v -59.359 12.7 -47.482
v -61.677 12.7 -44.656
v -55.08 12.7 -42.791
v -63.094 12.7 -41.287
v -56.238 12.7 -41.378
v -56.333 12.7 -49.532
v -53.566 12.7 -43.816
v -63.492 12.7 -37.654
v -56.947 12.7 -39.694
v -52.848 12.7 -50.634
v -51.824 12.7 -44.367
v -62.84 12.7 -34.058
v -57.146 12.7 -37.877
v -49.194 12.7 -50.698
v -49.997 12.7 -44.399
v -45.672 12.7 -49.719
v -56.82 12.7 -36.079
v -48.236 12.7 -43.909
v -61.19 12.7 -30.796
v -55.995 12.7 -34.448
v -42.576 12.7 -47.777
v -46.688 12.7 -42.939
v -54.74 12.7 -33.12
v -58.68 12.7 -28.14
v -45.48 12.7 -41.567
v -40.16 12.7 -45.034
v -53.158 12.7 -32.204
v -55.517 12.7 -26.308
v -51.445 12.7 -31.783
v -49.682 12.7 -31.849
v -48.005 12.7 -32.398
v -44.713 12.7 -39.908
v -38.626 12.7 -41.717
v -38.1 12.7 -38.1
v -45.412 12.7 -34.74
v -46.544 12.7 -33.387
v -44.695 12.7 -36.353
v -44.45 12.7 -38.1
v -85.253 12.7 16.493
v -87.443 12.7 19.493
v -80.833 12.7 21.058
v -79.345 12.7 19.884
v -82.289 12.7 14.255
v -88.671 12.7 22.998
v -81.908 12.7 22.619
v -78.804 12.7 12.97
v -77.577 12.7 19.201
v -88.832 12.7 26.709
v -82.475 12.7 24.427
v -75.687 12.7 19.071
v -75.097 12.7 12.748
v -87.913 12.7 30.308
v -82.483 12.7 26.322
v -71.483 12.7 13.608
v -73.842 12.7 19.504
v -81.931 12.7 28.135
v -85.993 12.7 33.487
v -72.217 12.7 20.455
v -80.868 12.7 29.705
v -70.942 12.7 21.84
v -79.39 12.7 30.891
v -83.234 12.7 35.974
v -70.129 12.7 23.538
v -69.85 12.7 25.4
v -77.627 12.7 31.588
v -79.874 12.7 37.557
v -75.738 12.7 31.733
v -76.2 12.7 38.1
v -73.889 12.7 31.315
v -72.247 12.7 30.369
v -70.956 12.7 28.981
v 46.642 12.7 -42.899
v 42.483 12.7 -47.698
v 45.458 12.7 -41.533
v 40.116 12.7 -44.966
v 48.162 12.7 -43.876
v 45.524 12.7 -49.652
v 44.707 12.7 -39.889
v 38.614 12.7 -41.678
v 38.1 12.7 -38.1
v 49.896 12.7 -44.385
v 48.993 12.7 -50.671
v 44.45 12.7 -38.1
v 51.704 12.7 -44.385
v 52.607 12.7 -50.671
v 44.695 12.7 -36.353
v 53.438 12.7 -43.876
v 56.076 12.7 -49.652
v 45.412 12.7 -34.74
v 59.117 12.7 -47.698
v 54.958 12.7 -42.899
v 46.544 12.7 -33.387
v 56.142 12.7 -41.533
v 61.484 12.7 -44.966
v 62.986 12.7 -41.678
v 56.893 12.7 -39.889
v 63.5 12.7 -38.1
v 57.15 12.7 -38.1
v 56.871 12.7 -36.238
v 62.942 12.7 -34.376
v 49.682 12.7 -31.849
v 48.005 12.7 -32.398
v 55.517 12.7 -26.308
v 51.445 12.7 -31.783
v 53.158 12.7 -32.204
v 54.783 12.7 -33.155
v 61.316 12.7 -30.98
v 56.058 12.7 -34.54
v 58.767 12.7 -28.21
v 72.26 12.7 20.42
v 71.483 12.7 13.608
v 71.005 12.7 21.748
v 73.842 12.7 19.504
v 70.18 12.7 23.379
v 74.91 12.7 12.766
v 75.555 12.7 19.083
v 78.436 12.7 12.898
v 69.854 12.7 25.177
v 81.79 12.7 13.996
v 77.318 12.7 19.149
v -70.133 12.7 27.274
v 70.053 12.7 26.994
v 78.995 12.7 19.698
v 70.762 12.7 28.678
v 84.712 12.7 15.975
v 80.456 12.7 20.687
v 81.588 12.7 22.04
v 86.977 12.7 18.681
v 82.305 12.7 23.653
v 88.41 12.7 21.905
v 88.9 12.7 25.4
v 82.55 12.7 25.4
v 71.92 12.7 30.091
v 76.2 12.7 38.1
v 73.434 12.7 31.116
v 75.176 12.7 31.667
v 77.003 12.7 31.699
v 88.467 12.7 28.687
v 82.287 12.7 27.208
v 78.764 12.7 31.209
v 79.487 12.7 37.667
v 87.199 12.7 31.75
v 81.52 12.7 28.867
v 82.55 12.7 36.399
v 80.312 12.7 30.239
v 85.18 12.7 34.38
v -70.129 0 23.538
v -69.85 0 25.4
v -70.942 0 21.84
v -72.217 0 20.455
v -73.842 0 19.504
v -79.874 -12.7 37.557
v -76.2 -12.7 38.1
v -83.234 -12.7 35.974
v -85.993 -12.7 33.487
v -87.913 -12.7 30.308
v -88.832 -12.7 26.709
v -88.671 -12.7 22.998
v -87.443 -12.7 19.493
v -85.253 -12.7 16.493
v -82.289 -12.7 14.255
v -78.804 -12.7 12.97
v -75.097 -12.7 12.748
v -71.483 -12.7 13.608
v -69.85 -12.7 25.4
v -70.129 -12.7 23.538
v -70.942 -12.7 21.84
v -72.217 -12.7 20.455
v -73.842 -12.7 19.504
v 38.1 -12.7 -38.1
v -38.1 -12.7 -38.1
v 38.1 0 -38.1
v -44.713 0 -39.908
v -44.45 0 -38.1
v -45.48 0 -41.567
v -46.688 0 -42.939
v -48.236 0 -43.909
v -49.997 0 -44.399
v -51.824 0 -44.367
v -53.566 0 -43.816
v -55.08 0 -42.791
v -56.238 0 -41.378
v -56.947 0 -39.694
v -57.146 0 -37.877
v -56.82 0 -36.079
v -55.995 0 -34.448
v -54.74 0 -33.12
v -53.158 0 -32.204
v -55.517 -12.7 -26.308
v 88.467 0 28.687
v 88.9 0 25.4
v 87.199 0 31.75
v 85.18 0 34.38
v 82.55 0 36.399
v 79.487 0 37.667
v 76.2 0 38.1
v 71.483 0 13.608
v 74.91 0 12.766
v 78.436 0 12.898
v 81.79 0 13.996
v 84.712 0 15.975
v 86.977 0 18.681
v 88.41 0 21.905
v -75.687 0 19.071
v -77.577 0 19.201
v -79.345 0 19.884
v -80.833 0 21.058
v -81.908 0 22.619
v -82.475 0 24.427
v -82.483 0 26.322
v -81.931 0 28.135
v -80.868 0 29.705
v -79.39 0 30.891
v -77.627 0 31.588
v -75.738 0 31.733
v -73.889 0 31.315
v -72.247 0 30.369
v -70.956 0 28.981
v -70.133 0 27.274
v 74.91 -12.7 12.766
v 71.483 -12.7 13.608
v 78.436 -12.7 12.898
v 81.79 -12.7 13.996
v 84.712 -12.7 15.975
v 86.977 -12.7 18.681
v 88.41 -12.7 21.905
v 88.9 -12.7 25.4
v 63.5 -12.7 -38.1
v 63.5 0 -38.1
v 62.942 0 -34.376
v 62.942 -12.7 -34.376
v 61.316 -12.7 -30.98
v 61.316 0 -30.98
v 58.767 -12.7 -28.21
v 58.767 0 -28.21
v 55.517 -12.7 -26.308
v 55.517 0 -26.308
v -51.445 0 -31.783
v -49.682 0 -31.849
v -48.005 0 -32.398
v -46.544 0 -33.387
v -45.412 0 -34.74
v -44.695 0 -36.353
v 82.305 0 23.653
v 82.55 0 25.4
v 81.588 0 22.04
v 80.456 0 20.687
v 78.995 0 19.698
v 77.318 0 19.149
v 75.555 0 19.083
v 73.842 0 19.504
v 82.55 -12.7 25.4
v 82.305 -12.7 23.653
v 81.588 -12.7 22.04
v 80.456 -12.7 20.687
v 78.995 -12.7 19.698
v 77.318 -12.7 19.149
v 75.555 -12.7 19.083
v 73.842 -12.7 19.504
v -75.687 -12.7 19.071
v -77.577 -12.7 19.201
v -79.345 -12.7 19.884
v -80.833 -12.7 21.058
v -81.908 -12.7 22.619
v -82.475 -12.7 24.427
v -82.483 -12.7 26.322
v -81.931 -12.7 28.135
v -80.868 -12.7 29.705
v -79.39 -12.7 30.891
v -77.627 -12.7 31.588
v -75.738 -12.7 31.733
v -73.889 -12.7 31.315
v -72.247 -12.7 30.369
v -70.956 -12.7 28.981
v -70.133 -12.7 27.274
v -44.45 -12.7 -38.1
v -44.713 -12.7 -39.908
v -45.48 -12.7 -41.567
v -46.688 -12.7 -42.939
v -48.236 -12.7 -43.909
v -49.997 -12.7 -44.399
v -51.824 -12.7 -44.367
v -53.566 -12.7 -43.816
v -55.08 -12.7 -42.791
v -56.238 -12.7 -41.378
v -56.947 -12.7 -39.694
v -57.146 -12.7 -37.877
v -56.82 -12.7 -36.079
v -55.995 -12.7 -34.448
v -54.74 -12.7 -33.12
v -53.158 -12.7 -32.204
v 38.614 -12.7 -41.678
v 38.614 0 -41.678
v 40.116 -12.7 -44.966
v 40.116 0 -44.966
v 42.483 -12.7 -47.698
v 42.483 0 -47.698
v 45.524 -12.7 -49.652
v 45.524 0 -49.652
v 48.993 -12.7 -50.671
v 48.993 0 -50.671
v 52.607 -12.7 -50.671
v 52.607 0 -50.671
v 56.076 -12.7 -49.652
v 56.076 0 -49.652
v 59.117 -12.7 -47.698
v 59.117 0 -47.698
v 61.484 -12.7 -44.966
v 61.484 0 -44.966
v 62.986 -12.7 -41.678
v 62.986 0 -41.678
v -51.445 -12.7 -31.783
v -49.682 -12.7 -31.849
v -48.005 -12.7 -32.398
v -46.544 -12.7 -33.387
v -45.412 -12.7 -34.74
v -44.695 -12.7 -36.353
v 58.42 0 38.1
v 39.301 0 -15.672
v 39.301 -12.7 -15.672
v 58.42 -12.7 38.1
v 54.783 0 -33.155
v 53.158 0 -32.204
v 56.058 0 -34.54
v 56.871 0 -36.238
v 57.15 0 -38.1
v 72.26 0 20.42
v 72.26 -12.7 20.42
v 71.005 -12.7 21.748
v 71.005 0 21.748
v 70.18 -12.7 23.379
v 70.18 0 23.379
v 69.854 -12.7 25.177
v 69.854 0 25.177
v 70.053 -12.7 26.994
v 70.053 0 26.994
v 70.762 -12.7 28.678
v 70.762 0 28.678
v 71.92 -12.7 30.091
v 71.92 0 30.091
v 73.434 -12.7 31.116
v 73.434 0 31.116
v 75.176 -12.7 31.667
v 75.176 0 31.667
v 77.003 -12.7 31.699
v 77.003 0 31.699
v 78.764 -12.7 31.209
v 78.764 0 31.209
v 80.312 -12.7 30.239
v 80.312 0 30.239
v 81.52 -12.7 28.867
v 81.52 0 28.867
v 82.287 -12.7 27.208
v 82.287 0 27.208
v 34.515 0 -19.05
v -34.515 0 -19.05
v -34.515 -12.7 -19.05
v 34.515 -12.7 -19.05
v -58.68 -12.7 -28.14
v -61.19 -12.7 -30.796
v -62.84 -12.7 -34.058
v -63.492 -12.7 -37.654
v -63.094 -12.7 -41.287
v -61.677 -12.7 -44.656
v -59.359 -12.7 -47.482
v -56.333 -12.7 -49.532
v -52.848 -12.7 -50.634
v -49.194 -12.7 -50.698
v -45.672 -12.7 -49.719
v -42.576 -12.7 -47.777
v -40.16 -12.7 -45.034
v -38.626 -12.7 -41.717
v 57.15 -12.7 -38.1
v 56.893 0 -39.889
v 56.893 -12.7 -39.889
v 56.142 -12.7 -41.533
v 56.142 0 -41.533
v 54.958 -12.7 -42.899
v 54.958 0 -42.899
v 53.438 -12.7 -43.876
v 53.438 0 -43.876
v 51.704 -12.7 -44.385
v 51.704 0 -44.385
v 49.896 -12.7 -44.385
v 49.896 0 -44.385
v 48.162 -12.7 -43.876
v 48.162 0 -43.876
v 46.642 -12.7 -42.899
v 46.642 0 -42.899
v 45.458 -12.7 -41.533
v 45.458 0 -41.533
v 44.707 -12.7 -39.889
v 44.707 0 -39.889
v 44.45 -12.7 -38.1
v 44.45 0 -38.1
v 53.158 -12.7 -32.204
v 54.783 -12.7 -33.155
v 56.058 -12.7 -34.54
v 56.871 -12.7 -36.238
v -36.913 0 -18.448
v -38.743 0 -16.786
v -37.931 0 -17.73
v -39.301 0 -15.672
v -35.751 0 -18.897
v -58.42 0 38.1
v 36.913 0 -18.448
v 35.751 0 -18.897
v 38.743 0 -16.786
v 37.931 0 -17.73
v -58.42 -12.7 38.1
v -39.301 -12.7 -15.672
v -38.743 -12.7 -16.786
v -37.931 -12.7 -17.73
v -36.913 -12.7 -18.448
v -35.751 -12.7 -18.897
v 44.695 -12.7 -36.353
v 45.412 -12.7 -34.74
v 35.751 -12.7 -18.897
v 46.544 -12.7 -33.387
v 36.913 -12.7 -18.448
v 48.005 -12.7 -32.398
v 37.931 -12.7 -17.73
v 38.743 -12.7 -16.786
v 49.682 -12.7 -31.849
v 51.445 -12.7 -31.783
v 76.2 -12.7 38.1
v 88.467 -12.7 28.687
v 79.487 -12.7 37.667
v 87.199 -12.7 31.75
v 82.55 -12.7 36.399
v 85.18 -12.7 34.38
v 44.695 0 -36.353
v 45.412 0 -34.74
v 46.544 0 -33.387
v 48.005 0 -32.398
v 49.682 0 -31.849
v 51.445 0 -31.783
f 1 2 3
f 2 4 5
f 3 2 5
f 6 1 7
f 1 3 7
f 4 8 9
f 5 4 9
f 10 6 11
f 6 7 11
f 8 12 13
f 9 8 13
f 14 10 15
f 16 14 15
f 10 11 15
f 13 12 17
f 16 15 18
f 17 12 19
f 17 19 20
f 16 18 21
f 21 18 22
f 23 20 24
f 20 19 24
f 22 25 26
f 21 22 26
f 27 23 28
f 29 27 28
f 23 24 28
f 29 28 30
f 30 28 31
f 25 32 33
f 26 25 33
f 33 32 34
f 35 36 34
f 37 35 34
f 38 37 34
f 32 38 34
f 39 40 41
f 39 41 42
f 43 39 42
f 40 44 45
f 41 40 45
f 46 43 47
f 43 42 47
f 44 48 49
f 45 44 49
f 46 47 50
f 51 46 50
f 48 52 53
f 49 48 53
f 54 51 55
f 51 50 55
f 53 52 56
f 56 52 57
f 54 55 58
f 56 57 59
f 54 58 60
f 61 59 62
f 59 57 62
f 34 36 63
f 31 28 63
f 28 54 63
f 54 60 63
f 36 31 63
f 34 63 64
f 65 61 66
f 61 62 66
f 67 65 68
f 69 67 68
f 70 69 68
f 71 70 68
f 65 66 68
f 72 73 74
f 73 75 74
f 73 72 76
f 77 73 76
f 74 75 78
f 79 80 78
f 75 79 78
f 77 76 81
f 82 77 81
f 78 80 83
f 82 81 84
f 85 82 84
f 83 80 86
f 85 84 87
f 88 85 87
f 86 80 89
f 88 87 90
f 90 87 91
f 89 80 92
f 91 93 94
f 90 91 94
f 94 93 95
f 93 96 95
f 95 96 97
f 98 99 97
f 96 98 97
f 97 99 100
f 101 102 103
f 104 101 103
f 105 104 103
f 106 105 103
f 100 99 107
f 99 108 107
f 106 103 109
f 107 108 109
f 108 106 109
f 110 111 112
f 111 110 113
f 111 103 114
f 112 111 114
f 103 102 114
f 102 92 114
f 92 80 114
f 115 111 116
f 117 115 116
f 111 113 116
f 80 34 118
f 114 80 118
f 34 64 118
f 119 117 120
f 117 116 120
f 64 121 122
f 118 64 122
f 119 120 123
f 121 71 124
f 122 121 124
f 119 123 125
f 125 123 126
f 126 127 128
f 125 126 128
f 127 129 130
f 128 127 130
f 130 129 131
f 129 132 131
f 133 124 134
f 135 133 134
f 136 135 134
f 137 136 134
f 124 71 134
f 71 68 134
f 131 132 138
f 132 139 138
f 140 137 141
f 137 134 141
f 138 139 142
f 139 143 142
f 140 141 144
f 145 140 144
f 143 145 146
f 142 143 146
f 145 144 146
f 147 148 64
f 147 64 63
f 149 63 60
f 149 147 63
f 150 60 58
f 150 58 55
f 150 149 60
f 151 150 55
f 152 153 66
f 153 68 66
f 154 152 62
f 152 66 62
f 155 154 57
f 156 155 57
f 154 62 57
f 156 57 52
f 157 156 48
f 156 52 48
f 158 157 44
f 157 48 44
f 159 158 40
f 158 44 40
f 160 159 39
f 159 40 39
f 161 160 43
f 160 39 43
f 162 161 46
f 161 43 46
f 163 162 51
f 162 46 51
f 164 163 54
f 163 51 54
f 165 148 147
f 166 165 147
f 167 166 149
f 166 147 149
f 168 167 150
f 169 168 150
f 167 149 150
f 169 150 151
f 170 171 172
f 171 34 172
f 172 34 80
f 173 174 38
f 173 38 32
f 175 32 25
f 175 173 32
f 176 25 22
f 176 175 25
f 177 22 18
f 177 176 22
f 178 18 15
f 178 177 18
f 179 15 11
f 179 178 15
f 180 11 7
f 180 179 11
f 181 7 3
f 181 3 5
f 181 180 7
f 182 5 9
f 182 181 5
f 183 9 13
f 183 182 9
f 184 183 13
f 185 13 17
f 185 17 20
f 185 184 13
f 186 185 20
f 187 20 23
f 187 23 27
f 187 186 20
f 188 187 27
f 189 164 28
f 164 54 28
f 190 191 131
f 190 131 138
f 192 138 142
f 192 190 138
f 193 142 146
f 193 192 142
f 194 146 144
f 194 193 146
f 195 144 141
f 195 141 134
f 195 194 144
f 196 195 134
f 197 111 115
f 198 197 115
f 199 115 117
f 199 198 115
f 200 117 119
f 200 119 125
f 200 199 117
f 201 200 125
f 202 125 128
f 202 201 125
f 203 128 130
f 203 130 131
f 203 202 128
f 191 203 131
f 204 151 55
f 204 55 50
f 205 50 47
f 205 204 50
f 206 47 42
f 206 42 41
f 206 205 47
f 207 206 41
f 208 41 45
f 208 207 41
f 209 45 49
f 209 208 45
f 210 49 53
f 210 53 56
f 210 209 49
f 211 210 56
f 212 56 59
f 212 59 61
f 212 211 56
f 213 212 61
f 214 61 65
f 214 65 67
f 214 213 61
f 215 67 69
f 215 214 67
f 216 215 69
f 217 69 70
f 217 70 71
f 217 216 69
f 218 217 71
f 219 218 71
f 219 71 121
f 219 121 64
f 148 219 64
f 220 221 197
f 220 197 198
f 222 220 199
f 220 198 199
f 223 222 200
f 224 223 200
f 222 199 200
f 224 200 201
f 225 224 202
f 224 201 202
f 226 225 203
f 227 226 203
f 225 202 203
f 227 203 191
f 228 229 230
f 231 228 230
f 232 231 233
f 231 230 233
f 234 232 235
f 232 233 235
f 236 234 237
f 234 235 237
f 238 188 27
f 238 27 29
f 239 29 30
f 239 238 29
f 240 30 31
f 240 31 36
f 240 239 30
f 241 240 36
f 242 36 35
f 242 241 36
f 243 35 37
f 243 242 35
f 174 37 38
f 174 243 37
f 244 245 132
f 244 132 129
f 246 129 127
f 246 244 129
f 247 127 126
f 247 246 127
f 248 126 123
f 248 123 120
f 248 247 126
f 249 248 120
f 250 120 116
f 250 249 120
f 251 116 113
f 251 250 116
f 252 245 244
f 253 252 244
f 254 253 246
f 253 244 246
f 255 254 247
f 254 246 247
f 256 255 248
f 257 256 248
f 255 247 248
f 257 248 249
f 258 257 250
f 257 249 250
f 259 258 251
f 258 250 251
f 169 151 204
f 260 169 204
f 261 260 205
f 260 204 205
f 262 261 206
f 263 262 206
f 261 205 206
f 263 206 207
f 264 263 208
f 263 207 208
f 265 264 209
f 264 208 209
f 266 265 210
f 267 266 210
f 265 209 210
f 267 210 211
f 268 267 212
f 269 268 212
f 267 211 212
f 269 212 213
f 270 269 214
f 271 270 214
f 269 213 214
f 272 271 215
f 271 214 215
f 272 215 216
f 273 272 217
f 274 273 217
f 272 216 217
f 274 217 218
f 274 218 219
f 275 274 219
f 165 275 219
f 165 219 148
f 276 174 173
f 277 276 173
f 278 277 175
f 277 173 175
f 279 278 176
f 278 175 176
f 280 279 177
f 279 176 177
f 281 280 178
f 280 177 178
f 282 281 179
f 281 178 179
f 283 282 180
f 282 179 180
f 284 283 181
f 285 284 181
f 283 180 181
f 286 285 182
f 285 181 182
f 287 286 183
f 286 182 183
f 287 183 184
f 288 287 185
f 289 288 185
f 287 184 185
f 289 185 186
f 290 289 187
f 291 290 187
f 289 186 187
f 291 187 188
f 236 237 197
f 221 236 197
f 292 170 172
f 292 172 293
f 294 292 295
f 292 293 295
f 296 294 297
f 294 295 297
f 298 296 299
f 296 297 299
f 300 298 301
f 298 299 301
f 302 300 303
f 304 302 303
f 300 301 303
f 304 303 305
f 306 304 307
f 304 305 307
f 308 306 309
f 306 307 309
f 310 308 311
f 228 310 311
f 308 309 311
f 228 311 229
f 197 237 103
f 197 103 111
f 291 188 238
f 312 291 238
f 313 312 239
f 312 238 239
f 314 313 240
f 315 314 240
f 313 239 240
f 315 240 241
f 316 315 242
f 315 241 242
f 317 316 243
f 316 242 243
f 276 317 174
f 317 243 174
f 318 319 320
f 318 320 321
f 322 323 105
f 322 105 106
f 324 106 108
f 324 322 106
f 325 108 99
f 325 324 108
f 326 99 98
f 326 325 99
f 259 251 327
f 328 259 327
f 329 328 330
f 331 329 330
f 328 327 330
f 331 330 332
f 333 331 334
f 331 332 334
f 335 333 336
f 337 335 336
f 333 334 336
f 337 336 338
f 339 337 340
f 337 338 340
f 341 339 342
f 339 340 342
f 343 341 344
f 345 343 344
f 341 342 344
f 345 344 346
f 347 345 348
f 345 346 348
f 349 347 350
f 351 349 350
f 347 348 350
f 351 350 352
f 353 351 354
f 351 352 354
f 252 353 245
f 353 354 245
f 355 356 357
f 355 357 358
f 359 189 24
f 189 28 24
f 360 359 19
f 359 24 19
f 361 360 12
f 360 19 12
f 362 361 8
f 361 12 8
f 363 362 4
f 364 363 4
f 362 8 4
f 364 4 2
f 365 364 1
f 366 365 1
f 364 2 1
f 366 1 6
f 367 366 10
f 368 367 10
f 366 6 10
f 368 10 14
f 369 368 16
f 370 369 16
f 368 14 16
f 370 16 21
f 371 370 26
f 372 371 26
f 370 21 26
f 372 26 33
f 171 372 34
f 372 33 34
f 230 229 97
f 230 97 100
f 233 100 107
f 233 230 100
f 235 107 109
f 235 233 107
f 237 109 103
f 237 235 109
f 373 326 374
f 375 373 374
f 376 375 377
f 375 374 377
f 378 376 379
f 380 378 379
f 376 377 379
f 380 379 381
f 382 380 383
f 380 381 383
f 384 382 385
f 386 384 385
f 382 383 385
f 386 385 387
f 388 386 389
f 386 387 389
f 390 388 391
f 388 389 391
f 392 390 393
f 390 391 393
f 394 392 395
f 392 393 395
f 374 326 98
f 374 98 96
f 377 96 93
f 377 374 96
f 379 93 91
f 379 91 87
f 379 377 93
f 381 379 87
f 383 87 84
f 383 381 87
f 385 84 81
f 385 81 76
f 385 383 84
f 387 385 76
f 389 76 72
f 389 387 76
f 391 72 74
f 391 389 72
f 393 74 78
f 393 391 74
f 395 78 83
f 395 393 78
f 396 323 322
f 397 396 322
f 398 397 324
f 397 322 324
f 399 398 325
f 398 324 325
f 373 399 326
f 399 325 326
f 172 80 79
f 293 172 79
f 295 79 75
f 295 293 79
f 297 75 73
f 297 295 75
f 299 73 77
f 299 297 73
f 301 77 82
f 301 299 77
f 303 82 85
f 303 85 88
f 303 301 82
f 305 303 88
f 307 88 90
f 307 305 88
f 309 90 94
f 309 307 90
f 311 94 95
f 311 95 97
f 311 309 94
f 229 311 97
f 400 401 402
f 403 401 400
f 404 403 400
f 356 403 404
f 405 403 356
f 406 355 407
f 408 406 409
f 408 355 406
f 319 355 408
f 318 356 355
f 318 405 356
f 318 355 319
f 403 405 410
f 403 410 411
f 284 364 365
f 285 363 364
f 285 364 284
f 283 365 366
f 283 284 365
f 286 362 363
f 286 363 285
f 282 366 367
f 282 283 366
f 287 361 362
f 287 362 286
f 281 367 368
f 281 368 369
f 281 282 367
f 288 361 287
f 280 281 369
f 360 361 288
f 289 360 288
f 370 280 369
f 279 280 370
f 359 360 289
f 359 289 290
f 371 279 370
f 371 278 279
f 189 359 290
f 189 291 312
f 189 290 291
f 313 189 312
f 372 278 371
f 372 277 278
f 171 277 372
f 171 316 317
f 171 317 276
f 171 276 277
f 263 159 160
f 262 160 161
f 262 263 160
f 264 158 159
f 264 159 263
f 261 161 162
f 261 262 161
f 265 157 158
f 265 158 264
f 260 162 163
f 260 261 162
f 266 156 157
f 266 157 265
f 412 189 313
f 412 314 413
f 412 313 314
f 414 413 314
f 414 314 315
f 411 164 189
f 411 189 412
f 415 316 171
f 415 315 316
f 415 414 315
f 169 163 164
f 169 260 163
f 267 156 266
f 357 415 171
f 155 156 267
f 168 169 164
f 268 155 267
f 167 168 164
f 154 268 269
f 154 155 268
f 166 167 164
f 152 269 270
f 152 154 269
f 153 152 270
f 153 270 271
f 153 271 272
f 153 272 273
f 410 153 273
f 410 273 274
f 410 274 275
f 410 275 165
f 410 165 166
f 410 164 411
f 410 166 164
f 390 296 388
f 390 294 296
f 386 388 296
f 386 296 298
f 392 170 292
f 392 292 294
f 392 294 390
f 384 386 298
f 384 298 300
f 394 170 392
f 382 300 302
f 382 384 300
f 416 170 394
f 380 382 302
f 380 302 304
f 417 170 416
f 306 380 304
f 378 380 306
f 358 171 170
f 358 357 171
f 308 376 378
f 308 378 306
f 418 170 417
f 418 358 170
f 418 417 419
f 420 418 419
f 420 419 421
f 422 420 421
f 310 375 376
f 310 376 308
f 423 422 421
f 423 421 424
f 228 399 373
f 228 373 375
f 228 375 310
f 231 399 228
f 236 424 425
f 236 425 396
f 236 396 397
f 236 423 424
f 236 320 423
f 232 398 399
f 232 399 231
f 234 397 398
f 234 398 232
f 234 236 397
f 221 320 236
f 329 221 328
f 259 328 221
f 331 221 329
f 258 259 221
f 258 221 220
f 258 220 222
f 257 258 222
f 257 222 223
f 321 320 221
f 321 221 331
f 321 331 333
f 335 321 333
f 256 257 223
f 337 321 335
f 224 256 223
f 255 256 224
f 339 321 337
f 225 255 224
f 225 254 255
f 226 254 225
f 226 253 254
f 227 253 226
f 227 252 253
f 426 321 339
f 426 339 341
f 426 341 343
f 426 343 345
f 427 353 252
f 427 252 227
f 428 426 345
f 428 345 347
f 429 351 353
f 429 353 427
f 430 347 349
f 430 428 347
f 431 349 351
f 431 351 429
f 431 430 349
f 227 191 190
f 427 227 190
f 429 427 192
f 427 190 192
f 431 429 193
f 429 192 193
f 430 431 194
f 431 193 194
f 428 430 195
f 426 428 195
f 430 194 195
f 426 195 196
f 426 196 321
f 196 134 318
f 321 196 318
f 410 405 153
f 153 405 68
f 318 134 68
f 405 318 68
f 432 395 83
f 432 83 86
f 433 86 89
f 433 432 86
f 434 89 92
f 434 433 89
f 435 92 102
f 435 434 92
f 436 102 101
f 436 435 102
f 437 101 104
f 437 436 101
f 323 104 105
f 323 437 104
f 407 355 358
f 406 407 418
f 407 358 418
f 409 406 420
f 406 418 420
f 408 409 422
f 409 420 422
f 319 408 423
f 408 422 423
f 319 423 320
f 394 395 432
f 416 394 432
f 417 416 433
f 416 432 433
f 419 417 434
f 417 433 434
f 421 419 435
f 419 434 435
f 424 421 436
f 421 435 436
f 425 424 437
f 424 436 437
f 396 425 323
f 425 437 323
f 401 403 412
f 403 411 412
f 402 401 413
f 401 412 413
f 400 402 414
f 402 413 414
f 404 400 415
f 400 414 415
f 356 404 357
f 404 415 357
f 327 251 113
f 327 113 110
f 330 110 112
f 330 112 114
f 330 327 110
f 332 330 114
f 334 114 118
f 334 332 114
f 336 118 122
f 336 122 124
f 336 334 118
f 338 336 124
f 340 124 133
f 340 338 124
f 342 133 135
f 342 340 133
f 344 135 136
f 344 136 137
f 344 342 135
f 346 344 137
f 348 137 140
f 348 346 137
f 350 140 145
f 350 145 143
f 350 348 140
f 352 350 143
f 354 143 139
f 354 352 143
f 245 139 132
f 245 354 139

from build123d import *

# Parameters (mm, degrees)
F1_DEPTH = 12.7
F3_DEPTH = 38.1
F4_R     = 5.08


# Not quite as in the source:
# - a feature of the source that left no trace in its solid (it failed there, or was rolled back) is left out


with BuildPart() as f1:
    # F0 (on Front) → F1 (new body, symmetric)
    with BuildSketch(Plane.XZ):
        with BuildLine():
            Line((-38.1, -38.1), (0, -38.1))
            Line((0, -38.1), (38.1, -38.1))
            ThreePointArc((38.1, -38.1), (43.6800141218, -27.583546173), (55.5166615897, -26.3083460258))
            Line((55.5166615897, -26.3083460258), (71.4833384103, 13.6083460258))
            ThreePointArc((71.4833384103, 13.6083460258), (63.7291538885, 27.8016655187), (76.2, 38.1))
            Line((76.2, 38.1), (0, 38.1))
            Line((0, 38.1), (-76.2, 38.1))
            ThreePointArc((-76.2, 38.1), (-67.2197438789, 34.3802561211), (-63.5, 25.4))
            ThreePointArc((-63.5, 25.4), (-65.683546173, 18.2800141218), (-71.4833384103, 13.6083460258))
            Line((-71.4833384103, 13.6083460258), (-55.5166615897, -26.3083460258))
            ThreePointArc((-55.5166615897, -26.3083460258), (-43.6800141218, -27.583546173), (-38.1, -38.1))
        make_face()
        with BuildLine():
            ThreePointArc((55.5166615897, -26.3083460258), (43.6800141218, -27.583546173), (38.1, -38.1))
            Line((38.1, -38.1), (44.45, -38.1))
            ThreePointArc((44.45, -38.1), (47.2400070609, -32.8417730865), (53.1583307948, -32.2041730129))
            Line((53.1583307948, -32.2041730129), (55.5166615897, -26.3083460258))
        make_face()
        with BuildLine():
            Line((-44.45, -38.1), (-38.1, -38.1))
            ThreePointArc((-38.1, -38.1), (-43.6800141218, -27.583546173), (-55.5166615897, -26.3083460258))
            Line((-55.5166615897, -26.3083460258), (-53.1583307948, -32.2041730129))
            ThreePointArc((-53.1583307948, -32.2041730129), (-47.2400070609, -32.8417730865), (-44.45, -38.1))
        make_face()
        with BuildLine():
            ThreePointArc((-76.2, 38.1), (-88.6708461115, 22.9983344813), (-71.4833384103, 13.6083460258))
            ThreePointArc((-71.4833384103, 13.6083460258), (-65.683546173, 18.2800141218), (-63.5, 25.4))
            ThreePointArc((-63.5, 25.4), (-67.2197438789, 34.3802561211), (-76.2, 38.1))
        make_face()
        with BuildLine():
            ThreePointArc((-69.85, 25.4), (-70.9417730865, 21.8400070609), (-73.8416692052, 19.5041730129))
            ThreePointArc((-73.8416692052, 19.5041730129), (-81.4582269135, 28.9599929391), (-69.85, 25.4))
        make_face(mode=Mode.SUBTRACT)
        with BuildLine():
            ThreePointArc((76.2, 38.1), (63.7291538885, 27.8016655187), (71.4833384103, 13.6083460258))
            ThreePointArc((71.4833384103, 13.6083460258), (83.3199858782, 14.883546173), (88.9, 25.4))
            ThreePointArc((88.9, 25.4), (85.1802561211, 34.3802561211), (76.2, 38.1))
        make_face()
        with BuildLine():
            ThreePointArc((82.55, 25.4), (79.7599929391, 20.1417730865), (73.8416692052, 19.5041730129))
            ThreePointArc((73.8416692052, 19.5041730129), (72.6400070609, 30.6582269135), (82.55, 25.4))
        make_face(mode=Mode.SUBTRACT)
        with BuildLine():
            ThreePointArc((-55.5166615897, -26.3083460258), (-57.9199858782, -48.616453827), (-38.1, -38.1))
            Line((-38.1, -38.1), (-44.45, -38.1))
            ThreePointArc((-44.45, -38.1), (-54.3599929391, -43.3582269135), (-53.1583307948, -32.2041730129))
            Line((-53.1583307948, -32.2041730129), (-55.5166615897, -26.3083460258))
        make_face()
        with BuildLine():
            Line((44.45, -38.1), (38.1, -38.1))
            ThreePointArc((38.1, -38.1), (50.8, -50.8), (63.5, -38.1))
            ThreePointArc((63.5, -38.1), (61.316453827, -30.9800141218), (55.5166615897, -26.3083460258))
            Line((55.5166615897, -26.3083460258), (53.1583307948, -32.2041730129))
            ThreePointArc((53.1583307948, -32.2041730129), (56.0582269135, -34.5400070609), (57.15, -38.1))
            ThreePointArc((57.15, -38.1), (50.8, -44.45), (44.45, -38.1))
        make_face()
    extrude(amount=F1_DEPTH, both=True)

    # F2 (on Front) → F3 (cut)
    with BuildSketch(Plane.XZ):
        Polygon((-38.1, -19.05), (0, -19.05), (38.1, -19.05), (58.42, 38.1), (0, 38.1), (-58.42, 38.1), align=None)
    extrude(amount=F3_DEPTH, mode=Mode.SUBTRACT)

    # F4
    f4_edges = [f1.edges().sort_by_distance(p)[0] for p in [
        (-38.1, -6.35, -19.05),
        (38.1, -6.35, -19.05),
    ]]
    fillet(f4_edges, radius=F4_R)


solid = f1.part
